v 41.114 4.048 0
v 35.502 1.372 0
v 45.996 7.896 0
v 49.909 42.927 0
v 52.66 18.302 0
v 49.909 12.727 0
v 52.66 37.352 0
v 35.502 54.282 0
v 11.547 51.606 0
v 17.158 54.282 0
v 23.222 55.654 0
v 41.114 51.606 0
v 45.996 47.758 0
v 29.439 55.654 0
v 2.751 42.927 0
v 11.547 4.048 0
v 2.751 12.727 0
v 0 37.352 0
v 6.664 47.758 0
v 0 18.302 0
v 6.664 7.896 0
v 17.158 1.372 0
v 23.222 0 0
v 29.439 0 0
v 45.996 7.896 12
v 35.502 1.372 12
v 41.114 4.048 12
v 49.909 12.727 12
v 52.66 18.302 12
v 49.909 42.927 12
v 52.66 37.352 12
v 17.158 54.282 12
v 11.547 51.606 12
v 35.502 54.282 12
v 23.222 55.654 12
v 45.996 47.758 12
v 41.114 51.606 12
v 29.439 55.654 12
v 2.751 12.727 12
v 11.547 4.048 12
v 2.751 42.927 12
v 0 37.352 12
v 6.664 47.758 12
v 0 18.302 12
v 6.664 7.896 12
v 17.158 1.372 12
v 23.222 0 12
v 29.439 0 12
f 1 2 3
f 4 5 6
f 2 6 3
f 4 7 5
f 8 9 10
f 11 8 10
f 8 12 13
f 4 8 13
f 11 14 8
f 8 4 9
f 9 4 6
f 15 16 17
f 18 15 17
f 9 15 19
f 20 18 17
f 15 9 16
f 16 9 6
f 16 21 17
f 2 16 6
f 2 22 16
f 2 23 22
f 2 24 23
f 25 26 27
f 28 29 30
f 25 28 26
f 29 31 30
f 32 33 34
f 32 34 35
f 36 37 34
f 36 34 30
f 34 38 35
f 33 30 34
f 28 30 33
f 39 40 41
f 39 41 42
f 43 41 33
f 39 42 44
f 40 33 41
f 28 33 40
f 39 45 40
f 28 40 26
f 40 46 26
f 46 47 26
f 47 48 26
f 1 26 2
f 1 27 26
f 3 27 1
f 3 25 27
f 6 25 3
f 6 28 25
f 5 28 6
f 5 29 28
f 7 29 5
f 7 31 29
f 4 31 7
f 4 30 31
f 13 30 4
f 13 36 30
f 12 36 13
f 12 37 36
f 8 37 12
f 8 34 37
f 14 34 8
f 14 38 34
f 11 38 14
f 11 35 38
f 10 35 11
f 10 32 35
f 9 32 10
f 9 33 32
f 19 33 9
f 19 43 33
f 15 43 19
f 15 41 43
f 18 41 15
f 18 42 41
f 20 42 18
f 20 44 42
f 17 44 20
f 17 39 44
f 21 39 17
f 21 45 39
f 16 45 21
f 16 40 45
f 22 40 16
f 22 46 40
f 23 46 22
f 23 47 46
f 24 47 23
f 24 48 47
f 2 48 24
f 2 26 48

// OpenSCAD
$fn = 32;

// ----------------------------------------------------------------------
// Flat adaptor: double_d, 12 mm thick
// ----------------------------------------------------------------------

// --- parameters (mm) ---
profile_height = 12;      // extrusion height
profile_points = 24;      // points of the closed outline

profile = [[52.66, 37.352], [49.909, 42.927], [45.996, 47.758], [41.114, 51.606], [35.502, 54.282], [29.439, 55.654], [23.222, 55.654], [17.158, 54.282], [11.547, 51.606], [6.664, 47.758], [2.751, 42.927], [0, 37.352], [0, 18.302], [2.751, 12.727], [6.664, 7.896], [11.547, 4.048], [17.158, 1.372], [23.222, 0], [29.439, 0], [35.502, 1.372], [41.114, 4.048], [45.996, 7.896], [49.909, 12.727], [52.66, 18.302]];  // single closed polygon, 24 points, counter clockwise

// --- the one profile operation ---
linear_extrude(height = profile_height) polygon(points = profile);
